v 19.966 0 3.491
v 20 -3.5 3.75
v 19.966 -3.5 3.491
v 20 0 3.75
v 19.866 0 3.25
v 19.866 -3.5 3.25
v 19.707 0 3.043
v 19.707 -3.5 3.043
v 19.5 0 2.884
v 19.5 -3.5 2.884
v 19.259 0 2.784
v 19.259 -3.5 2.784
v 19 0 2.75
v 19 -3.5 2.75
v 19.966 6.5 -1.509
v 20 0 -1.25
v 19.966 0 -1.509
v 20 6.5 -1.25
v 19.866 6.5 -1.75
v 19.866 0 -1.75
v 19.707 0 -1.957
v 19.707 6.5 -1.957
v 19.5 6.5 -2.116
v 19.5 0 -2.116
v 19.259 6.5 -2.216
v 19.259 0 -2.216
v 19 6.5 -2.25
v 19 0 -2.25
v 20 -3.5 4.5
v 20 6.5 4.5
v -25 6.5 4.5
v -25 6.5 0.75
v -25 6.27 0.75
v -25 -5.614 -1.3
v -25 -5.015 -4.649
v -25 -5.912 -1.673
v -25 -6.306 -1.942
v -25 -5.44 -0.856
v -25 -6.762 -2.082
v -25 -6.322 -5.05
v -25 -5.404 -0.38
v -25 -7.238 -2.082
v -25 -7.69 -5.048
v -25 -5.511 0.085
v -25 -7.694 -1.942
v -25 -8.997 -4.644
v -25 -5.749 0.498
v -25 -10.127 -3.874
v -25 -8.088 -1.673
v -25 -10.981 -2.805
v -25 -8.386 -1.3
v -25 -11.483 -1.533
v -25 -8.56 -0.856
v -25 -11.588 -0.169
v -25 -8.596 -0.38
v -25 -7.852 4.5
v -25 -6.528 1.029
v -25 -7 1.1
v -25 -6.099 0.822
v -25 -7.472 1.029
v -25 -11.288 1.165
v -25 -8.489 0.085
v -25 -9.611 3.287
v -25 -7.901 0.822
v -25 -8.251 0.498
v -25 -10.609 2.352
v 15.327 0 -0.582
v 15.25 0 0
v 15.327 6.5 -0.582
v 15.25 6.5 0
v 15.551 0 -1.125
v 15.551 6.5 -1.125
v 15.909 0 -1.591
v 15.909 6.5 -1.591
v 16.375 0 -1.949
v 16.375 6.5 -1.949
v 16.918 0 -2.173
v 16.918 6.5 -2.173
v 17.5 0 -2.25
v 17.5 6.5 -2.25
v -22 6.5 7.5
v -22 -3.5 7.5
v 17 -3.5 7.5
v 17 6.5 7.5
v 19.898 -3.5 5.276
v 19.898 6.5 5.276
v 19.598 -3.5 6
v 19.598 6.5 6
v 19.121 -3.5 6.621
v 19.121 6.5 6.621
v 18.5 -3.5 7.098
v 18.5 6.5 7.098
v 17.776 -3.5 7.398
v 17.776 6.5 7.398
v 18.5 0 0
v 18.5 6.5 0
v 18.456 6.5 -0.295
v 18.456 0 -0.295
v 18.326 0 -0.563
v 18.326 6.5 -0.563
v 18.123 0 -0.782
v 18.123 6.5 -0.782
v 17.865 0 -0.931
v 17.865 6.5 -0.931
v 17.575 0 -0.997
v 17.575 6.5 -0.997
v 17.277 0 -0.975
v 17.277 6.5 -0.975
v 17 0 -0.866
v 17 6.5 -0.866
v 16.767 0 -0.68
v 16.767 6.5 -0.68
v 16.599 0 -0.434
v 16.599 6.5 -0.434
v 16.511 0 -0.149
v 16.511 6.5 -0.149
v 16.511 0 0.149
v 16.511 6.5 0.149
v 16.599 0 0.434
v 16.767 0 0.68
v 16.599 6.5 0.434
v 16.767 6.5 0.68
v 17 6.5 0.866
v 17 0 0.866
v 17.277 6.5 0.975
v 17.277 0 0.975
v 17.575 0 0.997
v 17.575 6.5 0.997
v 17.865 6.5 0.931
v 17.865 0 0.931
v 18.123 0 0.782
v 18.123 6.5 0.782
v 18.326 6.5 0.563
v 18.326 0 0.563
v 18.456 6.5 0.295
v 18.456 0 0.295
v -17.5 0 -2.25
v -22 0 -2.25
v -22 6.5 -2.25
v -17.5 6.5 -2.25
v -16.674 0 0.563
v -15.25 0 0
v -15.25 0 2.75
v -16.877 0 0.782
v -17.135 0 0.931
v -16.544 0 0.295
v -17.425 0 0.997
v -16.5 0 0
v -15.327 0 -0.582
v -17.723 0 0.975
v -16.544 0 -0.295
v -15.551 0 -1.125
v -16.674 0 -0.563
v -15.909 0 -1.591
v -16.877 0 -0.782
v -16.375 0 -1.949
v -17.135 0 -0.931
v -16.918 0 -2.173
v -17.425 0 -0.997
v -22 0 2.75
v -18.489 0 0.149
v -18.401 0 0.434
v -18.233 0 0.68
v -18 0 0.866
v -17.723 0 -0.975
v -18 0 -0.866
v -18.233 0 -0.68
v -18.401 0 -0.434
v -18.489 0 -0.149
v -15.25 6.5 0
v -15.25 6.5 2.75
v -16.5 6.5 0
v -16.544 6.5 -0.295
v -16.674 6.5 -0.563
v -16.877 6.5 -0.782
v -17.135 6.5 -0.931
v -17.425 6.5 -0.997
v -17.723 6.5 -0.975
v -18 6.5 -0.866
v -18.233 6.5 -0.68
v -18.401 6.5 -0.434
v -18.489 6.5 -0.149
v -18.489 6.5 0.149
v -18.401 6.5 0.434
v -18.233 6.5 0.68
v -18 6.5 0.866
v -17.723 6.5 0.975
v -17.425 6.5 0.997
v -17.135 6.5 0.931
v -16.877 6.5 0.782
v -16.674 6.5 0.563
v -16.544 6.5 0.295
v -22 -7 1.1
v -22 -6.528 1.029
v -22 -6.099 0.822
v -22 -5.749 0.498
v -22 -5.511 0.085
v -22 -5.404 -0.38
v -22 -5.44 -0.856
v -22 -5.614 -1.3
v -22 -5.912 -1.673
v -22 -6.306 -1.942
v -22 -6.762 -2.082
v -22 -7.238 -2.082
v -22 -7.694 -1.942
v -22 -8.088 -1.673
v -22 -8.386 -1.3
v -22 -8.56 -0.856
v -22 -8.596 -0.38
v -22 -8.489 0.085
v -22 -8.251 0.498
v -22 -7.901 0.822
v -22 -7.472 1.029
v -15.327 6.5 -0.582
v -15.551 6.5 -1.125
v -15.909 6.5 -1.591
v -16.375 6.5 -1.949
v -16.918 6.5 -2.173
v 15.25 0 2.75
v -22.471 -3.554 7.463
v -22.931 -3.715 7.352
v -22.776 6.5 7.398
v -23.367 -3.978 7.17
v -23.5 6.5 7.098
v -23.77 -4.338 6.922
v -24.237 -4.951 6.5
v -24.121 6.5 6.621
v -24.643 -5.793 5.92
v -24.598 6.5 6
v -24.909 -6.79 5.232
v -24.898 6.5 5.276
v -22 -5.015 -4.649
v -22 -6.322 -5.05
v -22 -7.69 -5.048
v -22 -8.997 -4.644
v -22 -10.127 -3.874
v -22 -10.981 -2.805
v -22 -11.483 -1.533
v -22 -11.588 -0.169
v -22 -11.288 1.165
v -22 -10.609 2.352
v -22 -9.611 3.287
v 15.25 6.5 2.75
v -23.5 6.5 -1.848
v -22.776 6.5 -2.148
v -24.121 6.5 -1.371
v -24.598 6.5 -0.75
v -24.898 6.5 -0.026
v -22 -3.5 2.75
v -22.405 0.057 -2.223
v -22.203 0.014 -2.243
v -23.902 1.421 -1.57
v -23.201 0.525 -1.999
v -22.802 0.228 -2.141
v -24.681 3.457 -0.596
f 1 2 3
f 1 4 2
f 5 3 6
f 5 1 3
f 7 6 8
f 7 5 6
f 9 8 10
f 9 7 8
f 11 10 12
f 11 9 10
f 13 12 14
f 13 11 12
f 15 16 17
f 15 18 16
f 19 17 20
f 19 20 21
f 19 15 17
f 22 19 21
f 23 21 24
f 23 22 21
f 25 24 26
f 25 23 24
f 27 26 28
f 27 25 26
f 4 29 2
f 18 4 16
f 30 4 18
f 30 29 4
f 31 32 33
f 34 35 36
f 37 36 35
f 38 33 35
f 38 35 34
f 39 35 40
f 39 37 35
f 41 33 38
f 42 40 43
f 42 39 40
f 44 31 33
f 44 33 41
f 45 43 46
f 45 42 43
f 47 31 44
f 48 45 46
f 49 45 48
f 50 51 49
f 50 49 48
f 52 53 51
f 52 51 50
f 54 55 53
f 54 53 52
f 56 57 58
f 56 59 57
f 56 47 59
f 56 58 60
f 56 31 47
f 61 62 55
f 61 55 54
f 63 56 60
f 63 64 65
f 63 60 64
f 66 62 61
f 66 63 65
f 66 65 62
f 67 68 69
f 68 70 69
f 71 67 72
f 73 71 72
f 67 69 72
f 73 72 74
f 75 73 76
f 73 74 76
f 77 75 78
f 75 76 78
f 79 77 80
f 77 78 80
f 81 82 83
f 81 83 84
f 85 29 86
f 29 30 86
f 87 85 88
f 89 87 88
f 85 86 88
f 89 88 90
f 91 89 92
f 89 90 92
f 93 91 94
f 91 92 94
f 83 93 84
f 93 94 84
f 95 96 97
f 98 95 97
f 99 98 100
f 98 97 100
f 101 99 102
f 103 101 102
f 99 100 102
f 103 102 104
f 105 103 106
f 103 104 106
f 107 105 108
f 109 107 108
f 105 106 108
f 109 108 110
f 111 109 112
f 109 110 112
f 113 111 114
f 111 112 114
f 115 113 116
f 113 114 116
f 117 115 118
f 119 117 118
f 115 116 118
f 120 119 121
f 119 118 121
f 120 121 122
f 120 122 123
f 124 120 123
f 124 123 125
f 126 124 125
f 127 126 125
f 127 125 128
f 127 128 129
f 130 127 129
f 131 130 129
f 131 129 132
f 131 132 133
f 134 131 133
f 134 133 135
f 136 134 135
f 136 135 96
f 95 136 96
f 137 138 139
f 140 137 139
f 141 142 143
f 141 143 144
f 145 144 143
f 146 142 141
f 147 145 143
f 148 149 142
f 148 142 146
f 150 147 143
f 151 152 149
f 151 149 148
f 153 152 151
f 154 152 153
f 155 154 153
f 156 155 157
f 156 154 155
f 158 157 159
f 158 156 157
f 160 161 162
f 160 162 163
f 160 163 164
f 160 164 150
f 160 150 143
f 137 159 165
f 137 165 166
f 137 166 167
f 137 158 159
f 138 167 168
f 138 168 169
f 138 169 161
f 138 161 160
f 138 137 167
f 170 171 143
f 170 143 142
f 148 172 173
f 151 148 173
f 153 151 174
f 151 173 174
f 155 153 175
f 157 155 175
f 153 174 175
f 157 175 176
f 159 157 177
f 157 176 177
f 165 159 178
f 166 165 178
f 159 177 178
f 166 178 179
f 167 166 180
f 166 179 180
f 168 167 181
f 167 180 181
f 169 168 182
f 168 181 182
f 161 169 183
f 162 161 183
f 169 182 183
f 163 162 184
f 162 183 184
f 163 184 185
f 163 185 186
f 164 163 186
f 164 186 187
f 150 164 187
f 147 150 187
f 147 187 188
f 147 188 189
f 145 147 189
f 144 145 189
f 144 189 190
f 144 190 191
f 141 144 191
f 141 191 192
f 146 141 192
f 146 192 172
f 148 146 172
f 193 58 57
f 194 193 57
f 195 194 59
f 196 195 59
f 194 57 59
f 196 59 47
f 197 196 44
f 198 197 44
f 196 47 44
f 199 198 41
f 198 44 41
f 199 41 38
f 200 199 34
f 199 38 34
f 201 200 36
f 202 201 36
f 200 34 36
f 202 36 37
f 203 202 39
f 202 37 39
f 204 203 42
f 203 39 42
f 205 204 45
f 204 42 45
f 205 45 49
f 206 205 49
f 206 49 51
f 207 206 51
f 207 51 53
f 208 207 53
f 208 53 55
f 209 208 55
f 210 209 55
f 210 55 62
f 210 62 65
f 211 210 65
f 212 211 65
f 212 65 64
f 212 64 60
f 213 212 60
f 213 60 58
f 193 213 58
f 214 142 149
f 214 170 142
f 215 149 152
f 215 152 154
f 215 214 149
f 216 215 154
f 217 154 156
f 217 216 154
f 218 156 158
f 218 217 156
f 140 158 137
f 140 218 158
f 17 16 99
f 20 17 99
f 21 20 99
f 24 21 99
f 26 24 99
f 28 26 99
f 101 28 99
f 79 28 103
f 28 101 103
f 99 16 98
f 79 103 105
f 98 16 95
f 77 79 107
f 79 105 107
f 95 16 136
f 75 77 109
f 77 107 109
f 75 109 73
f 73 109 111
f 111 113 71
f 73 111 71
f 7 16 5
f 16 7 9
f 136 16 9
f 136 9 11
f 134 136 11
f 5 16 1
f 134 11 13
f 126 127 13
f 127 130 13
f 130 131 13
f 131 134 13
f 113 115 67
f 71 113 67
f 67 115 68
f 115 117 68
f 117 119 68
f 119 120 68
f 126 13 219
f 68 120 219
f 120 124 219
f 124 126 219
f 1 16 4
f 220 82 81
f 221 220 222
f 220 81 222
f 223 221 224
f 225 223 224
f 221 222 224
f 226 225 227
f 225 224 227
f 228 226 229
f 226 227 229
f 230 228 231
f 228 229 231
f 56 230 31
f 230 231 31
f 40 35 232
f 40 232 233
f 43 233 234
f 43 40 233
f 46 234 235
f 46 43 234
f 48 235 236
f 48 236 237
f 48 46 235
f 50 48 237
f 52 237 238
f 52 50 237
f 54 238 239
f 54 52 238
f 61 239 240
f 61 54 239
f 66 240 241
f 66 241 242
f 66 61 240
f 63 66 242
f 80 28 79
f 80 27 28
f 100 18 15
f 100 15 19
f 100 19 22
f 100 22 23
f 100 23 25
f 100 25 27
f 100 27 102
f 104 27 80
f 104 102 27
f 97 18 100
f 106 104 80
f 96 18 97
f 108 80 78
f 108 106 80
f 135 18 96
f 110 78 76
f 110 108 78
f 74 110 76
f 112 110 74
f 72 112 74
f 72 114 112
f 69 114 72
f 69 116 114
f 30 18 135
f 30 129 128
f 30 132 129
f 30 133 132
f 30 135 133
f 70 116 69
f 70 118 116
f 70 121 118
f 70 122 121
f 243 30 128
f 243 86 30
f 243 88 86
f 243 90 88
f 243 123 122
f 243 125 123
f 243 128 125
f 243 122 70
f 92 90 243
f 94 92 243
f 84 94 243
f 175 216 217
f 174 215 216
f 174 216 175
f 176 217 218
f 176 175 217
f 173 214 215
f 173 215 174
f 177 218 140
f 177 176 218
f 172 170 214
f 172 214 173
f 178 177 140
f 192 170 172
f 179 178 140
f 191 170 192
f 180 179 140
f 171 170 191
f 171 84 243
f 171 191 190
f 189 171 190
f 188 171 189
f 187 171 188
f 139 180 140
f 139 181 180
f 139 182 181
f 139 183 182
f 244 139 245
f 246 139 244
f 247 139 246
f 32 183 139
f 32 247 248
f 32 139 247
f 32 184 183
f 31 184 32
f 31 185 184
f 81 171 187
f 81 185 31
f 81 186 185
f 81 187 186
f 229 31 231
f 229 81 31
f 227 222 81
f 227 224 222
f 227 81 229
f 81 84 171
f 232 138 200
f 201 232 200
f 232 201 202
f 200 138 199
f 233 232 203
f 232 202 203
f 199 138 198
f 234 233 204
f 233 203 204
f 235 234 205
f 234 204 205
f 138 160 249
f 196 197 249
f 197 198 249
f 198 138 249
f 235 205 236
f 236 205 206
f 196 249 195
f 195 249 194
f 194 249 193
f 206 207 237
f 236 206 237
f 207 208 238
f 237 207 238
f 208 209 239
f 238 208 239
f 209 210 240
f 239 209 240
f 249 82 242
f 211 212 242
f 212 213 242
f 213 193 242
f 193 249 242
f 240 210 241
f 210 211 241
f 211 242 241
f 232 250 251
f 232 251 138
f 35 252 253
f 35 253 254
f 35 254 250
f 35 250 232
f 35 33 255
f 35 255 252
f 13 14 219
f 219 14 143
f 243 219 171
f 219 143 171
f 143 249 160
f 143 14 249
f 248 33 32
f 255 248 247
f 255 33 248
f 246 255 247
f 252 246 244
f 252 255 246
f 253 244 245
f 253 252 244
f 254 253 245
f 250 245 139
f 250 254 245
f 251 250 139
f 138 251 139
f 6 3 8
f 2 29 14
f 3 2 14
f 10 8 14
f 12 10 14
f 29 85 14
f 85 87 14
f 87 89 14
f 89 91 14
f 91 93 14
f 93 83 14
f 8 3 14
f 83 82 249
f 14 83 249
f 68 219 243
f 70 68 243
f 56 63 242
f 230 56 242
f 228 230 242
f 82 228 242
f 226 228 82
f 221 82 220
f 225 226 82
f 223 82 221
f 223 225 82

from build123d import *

# Parameters (mm, degrees)
BOSS_EXTRUDE1_DEPTH        = 3
SKETCH2_W                  = 9.75
SKETCH2_H                  = 10
BOSS_EXTRUDE2_DEPTH        = 6.75
SKETCH3_W                  = 6.75
SKETCH3_H                  = 3.5
CUT_EXTRUDE1_DEPTH         = 5
SKETCH4_W                  = 4.75
SKETCH4_H                  = 10
BOSS_EXTRUDE3_DEPTH        = 35.25
SKETCH5_W                  = 4.75
SKETCH5_H                  = 6.5
BOSS_EXTRUDE4_DEPTH        = 5
F_2_0_2_DIAMETER_HOLE1_D   = 2
F_3_2_3_2_DIAMETER_HOLE1_D = 3.2
FILLET1_R                  = 1
FILLET2_R                  = 2.25
FILLET3_R                  = 3


with BuildPart() as part:
    # Sketch1 → Boss-Extrude1 (new body)
    with BuildSketch(Plane(origin=(-25, 0, 0), x_dir=(0, -1, 0), z_dir=(-1, 0, 0))):
        with BuildLine():
            Line((-6.5, -2.25), (0, -2.25))
            Line((0, -2.25), (5.014501105, -4.64943299))
            ThreePointArc((5.014501105, -4.64943299), (10.980645857, -2.805310946), (9.610876171, 3.287258325))
            Line((9.610876171, 3.287258325), (3.5, 7.5))
            Line((3.5, 7.5), (-6.5, 7.5))
            Line((-6.5, 7.5), (-6.5, -2.25))
        make_face()
    extrude(amount=-BOSS_EXTRUDE1_DEPTH)

    # Sketch2 → Boss-Extrude2 (add)
    with BuildSketch(Plane(origin=(-22, 0, 0), x_dir=(0, 0, -1), z_dir=(1, 0, 0))):
        with Locations((-2.625, 1.5)):
            Rectangle(SKETCH2_W, SKETCH2_H)
    extrude(amount=BOSS_EXTRUDE2_DEPTH)

    # Sketch3 → Cut-Extrude1 (cut)
    with BuildSketch(Plane(origin=(0, 0, -2.25), x_dir=(-1, 0, 0), z_dir=(0, 0, -1))):
        with Locations((18.625, -1.75)):
            Rectangle(SKETCH3_W, SKETCH3_H)
    extrude(amount=-CUT_EXTRUDE1_DEPTH, mode=Mode.SUBTRACT)

    # Sketch4 → Boss-Extrude3 (add)
    with BuildSketch(Plane(origin=(-15.25, 0, 0), x_dir=(0, 0, -1), z_dir=(1, 0, 0))):
        with Locations((-5.125, 1.5)):
            Rectangle(SKETCH4_W, SKETCH4_H)
    extrude(amount=BOSS_EXTRUDE3_DEPTH)

    # Sketch5 → Boss-Extrude4 (add)
    with BuildSketch(Plane(origin=(0, 0, 2.75), x_dir=(-1, 0, 0), z_dir=(0, 0, -1))):
        with Locations((-17.625, 3.25)):
            Rectangle(SKETCH5_W, SKETCH5_H)
    extrude(amount=BOSS_EXTRUDE4_DEPTH)

    # Ø2.0 (2) Diameter Hole1 (through all)
    with Locations(Plane(origin=(0, 0, 0), x_dir=(-1, 0, 0), z_dir=(0, -1, 0))):
        with Locations((-17.5, 0), (17.5, 0)):
            Hole(F_2_0_2_DIAMETER_HOLE1_D / 2)

    # Ø3.2 (3.2) Diameter Hole1 (through all)
    with Locations(Plane(origin=(-22, 0, 0), x_dir=(0, 0, -1), z_dir=(1, 0, 0))):
        with Locations((0.5, -7)):
            Hole(F_3_2_3_2_DIAMETER_HOLE1_D / 2)

    # Fillet1
    fillet1_edges = [part.edges().sort_by_distance(p)[0] for p in [
        (20, -1.75, 2.75),
        (20, 3.25, -2.25),
    ]]
    fillet(fillet1_edges, radius=FILLET1_R)

    # Fillet2
    fillet2_edges = [part.edges().sort_by_distance(p)[0] for p in [
        (-15.25, 3.25, -2.25),
        (15.25, 3.25, -2.25),
    ]]
    fillet(fillet2_edges, radius=FILLET2_R)

    # Fillet3
    fillet3_edges = [part.edges().sort_by_distance(p)[0] for p in [
        (20, 1.5, 7.5),
        (-25, 3.25, -2.25),
        (-25, 1.5, 7.5),
    ]]
    fillet(fillet3_edges, radius=FILLET3_R)


solid = part.part
